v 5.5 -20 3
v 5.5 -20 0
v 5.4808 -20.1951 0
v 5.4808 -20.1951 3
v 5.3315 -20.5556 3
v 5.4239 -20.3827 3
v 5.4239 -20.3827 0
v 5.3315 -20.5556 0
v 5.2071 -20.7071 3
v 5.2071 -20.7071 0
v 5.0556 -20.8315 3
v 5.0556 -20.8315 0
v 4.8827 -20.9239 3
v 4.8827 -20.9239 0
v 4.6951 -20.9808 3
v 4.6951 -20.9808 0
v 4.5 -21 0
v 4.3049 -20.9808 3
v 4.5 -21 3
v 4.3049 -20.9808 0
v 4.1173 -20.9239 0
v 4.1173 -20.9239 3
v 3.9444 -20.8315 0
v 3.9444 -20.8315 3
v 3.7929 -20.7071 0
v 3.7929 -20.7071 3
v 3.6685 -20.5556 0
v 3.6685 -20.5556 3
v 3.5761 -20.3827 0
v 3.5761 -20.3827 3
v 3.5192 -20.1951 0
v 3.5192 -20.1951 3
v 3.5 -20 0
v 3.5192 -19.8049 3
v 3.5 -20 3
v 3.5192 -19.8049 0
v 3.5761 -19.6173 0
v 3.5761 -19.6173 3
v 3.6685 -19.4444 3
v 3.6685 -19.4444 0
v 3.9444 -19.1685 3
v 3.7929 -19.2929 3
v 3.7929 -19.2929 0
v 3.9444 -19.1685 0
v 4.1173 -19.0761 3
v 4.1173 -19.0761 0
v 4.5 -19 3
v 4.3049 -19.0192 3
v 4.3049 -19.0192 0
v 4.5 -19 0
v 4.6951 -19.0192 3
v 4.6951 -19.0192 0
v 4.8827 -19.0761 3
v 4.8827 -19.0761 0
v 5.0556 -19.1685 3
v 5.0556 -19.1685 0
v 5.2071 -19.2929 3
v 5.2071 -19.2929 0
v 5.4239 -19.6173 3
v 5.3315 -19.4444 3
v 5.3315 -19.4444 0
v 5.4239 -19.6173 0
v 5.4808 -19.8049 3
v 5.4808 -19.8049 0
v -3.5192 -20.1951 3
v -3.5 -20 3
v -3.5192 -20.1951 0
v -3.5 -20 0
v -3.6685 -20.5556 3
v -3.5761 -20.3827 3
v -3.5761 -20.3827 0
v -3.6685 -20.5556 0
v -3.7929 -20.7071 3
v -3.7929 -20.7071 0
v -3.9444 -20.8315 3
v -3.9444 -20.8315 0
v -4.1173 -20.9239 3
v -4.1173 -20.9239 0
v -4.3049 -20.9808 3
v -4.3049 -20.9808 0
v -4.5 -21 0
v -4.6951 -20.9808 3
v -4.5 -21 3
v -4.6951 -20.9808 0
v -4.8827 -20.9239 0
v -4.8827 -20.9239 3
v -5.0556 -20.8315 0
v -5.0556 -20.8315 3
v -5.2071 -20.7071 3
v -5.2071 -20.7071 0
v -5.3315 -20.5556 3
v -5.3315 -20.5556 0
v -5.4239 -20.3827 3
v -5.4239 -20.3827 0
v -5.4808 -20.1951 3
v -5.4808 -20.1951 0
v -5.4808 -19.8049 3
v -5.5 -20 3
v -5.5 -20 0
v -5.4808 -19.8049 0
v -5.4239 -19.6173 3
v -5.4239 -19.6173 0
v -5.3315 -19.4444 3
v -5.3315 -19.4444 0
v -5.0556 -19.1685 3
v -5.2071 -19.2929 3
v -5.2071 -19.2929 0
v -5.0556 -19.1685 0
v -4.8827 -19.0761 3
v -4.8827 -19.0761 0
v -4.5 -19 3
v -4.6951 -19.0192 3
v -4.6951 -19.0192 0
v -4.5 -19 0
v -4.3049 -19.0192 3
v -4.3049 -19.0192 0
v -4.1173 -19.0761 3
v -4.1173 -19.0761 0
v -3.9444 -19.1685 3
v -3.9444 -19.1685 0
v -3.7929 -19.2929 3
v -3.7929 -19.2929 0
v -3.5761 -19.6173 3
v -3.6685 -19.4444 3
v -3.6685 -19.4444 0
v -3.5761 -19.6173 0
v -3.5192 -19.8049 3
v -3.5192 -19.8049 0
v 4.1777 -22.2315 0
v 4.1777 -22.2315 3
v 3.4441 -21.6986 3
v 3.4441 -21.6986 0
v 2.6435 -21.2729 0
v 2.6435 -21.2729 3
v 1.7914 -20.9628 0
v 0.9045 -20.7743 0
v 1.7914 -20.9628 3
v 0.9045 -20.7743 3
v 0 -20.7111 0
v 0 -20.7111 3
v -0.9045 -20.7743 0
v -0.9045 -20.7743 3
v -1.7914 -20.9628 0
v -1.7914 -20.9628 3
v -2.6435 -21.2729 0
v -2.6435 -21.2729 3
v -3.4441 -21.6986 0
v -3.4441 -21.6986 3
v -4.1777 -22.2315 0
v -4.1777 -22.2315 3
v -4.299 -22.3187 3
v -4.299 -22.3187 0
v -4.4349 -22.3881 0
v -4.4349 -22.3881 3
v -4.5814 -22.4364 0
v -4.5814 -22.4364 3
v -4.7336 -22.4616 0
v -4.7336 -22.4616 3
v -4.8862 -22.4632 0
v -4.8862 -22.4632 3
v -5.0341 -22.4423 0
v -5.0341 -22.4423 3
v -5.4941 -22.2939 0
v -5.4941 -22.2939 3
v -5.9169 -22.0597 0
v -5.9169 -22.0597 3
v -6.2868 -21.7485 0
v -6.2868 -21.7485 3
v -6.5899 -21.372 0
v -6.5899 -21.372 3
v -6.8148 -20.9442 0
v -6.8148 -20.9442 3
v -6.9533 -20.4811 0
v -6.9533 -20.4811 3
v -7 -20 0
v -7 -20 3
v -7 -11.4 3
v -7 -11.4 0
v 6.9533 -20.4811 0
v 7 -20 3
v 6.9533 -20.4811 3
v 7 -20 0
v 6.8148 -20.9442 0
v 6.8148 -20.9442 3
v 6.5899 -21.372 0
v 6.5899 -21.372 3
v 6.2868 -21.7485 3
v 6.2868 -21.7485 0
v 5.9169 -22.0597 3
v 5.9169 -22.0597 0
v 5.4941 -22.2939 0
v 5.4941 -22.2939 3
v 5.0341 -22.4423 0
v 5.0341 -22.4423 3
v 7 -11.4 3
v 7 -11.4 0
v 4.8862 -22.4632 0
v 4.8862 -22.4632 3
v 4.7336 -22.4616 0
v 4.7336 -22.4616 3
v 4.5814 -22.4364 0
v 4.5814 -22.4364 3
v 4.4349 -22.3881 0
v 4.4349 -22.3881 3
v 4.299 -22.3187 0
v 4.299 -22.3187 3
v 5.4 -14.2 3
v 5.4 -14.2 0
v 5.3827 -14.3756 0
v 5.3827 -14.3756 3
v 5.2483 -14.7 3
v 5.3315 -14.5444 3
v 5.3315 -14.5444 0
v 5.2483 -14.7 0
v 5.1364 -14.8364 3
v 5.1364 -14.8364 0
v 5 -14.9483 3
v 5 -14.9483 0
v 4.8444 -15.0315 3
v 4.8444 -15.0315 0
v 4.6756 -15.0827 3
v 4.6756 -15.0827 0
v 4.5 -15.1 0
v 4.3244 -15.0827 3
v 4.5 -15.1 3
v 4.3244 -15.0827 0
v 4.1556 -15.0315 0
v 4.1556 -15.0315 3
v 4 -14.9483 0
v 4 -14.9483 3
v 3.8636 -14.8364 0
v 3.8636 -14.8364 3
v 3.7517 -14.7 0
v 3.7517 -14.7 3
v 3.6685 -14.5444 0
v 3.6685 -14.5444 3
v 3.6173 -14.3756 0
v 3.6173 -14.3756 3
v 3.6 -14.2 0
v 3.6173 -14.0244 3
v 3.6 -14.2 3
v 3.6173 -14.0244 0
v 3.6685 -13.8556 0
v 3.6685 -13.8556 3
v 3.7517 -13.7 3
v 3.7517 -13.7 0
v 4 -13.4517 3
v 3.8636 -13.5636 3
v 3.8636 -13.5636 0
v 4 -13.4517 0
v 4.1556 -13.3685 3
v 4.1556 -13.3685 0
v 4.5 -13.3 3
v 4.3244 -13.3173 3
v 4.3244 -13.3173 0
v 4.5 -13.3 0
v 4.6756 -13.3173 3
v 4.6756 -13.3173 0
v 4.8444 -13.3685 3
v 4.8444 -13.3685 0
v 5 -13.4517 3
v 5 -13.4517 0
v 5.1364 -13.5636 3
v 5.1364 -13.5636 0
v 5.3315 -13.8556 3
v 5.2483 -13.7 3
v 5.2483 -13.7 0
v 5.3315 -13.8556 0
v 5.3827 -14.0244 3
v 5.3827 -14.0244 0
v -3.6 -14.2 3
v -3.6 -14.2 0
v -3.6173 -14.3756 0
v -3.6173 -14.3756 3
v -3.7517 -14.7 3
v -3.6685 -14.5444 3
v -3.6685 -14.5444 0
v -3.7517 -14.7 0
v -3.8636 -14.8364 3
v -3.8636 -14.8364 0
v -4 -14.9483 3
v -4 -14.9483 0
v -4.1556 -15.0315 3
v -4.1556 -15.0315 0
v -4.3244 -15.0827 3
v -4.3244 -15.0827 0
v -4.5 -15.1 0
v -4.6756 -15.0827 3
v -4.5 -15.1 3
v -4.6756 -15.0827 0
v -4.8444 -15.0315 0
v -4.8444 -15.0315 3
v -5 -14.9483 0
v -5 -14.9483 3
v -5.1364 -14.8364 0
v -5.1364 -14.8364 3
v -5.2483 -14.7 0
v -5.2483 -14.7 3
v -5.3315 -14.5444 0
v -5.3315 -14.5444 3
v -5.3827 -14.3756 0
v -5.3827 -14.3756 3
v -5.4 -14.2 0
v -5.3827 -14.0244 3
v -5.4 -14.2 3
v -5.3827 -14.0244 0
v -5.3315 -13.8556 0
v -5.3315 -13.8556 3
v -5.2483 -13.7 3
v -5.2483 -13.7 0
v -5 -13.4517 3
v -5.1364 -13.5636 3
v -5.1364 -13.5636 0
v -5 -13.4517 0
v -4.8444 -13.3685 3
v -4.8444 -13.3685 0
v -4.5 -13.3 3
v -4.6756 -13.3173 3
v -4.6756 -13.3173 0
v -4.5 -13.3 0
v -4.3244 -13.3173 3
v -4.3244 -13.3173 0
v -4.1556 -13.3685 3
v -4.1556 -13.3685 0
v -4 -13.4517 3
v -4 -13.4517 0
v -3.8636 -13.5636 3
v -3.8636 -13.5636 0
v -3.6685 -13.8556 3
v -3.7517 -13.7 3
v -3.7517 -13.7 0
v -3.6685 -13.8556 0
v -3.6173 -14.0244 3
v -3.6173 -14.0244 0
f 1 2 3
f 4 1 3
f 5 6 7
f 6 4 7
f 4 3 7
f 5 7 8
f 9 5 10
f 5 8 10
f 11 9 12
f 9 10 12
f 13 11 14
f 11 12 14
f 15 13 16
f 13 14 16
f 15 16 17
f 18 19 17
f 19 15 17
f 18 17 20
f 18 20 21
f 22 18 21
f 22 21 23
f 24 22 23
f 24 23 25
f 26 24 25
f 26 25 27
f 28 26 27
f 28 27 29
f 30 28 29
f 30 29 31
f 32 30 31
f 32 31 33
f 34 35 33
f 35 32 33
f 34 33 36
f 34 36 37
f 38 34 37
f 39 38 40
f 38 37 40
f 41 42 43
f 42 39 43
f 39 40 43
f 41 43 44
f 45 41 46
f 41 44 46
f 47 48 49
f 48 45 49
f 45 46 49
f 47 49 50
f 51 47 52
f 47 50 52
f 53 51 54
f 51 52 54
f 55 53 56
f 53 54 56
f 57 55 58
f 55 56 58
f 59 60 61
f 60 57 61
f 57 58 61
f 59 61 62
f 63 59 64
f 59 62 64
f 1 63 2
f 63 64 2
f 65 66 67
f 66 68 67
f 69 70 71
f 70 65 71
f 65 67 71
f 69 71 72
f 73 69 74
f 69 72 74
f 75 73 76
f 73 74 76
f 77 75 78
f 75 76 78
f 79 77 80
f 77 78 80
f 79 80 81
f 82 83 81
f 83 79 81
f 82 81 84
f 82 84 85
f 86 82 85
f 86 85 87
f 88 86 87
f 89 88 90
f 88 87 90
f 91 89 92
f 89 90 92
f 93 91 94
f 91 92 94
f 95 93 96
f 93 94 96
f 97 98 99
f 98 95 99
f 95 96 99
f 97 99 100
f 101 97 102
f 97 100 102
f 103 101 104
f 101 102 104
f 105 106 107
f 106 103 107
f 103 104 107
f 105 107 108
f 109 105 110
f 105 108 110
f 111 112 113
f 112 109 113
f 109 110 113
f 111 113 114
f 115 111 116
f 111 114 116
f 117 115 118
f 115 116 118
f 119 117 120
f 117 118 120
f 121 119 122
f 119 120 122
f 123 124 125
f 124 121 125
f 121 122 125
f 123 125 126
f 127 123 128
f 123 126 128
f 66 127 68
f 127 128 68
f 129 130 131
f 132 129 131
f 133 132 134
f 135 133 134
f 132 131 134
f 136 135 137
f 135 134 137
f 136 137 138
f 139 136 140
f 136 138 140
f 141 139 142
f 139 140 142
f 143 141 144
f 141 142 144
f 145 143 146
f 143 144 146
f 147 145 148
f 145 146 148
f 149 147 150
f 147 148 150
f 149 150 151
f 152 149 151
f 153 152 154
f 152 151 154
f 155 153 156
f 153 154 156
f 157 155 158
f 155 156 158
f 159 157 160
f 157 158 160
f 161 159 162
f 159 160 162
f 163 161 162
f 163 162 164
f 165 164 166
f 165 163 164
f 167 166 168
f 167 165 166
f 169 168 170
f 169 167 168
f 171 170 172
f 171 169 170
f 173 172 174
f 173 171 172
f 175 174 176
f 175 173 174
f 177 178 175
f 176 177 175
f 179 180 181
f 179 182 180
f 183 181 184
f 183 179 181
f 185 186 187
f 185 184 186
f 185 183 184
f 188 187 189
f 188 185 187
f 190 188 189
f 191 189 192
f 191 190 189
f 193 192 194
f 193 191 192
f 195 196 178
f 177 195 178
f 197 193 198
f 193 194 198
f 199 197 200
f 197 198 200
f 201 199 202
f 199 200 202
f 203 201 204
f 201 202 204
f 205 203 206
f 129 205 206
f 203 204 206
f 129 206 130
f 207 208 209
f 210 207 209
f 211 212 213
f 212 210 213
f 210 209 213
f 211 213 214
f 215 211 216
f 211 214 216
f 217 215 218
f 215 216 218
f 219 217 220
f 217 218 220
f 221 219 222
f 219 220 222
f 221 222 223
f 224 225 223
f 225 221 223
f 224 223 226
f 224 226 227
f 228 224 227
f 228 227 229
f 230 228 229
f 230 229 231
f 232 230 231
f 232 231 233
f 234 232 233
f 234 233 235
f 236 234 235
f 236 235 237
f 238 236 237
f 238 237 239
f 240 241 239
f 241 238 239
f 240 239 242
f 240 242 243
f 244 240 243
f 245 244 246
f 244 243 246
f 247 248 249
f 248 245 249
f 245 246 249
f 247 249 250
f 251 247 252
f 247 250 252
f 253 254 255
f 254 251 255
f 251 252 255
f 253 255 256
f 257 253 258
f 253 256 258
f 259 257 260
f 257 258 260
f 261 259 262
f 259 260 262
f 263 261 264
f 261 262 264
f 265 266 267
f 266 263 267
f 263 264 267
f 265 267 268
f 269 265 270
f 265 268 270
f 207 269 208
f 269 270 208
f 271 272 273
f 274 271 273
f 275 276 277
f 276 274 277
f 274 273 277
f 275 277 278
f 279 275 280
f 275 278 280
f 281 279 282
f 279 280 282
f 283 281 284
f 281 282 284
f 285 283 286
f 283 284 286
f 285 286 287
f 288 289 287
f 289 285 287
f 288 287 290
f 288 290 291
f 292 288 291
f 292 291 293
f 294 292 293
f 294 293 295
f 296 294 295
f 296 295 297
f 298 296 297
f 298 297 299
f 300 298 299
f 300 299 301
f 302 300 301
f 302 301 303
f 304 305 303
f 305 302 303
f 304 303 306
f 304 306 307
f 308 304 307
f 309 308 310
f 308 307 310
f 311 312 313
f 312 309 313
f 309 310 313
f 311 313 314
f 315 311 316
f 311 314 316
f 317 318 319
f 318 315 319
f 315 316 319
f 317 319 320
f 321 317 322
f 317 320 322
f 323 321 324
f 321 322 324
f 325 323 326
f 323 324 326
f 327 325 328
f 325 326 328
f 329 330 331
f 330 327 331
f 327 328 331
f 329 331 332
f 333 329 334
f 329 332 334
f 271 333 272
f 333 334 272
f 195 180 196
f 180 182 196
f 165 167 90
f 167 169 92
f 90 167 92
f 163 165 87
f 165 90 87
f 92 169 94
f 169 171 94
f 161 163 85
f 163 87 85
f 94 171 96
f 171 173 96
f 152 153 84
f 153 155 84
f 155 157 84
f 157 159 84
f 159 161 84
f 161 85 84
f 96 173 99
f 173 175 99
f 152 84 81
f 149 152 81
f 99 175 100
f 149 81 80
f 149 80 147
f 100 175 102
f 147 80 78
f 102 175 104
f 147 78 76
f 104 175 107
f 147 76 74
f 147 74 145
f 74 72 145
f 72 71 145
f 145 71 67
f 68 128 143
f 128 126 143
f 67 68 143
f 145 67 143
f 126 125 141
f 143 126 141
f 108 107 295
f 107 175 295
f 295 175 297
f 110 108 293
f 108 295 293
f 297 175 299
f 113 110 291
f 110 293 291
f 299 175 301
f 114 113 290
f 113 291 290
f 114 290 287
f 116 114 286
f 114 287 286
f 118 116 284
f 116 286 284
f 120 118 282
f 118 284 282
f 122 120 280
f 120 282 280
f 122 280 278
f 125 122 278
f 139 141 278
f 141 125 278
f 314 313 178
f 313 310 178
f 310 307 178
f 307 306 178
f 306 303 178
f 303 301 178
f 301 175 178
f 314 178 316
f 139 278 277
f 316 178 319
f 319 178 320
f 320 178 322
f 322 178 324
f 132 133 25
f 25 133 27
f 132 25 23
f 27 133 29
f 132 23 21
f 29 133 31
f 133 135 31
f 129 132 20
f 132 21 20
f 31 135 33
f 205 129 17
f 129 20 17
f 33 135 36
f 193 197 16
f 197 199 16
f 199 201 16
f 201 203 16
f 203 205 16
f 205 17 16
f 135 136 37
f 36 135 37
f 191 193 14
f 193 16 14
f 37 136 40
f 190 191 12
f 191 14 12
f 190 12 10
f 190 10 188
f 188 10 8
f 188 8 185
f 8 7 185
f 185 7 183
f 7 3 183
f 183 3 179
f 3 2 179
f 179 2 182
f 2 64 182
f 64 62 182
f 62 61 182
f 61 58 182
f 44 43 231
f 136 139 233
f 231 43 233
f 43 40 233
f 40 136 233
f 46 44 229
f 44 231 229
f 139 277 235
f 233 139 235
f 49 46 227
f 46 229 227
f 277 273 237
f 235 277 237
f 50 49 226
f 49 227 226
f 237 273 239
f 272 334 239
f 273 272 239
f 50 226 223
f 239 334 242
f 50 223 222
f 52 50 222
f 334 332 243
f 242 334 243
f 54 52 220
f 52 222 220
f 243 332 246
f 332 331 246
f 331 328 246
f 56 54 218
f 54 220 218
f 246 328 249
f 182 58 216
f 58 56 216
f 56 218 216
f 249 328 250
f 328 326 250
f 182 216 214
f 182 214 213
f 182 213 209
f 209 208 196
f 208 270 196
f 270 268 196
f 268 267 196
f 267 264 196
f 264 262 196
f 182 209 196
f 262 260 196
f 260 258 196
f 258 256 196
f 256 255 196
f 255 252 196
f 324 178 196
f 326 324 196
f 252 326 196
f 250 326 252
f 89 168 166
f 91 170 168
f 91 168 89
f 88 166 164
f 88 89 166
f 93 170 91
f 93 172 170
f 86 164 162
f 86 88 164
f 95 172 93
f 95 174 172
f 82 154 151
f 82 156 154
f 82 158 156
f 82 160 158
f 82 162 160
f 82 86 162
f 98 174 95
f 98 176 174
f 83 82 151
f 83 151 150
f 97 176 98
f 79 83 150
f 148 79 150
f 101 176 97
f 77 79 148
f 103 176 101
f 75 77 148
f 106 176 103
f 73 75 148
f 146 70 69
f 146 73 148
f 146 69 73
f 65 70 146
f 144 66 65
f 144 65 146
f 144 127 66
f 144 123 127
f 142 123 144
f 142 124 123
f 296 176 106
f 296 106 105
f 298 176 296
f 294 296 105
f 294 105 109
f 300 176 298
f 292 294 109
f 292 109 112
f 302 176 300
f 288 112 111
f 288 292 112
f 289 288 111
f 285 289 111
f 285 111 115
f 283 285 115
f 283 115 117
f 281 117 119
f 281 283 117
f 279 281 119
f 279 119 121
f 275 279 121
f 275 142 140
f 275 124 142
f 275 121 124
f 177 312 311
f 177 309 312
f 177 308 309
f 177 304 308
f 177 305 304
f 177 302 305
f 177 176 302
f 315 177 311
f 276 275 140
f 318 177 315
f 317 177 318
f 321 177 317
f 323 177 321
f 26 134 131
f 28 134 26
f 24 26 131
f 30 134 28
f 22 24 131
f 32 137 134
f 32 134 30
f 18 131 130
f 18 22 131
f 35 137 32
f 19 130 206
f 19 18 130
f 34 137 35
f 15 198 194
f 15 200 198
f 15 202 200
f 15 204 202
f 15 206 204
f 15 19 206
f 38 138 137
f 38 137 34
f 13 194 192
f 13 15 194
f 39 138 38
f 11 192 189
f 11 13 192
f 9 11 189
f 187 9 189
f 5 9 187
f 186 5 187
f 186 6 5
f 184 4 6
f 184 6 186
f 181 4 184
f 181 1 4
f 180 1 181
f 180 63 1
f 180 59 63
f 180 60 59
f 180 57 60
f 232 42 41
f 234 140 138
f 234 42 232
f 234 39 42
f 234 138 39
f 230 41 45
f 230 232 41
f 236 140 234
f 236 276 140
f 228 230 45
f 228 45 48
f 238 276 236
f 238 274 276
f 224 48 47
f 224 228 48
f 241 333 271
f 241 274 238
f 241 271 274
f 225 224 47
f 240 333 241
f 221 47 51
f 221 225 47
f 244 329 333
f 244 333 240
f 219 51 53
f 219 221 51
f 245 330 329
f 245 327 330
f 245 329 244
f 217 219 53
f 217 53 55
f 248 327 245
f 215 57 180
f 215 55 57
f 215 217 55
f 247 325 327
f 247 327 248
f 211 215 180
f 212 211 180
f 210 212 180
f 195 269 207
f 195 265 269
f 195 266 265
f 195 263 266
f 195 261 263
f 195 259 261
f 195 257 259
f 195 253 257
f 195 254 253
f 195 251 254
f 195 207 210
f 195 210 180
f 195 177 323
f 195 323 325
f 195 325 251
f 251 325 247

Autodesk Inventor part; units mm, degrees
ref_plane "YZ Plane" through (0, 0, 0) normal (1, 0, 0) x (0, 1, 0)
ref_plane "XZ Plane" through (0, 0, 0) normal (0, 1, 0) x (-1, 0, 0)
ref_plane "XY Plane" through (0, 0, 0) normal (0, 0, 1) x (1, 0, 0)
sketch "Sketch1" plane through (0, 0, 0) normal (0, 0, 1) x (1, 0, 0)
  line L0 (7, -20) -> (7, -17)
  line L1 (-7, -17) -> (7, -17)
  line L2 (-7, -17) -> (-7, -20)
  arc A0 (-7, -20) -> (-4.5, -22.5) centre (-4.5, -20) ccw
  line L3 (-4.5, -22.5) -> (4.5, -22.5)
  arc A1 (4.5, -22.5) -> (7, -20) centre (4.5, -20) ccw
  circle A2 centre (-4.5, -20) radius 1
  circle A3 centre (4.5, -20) radius 1
  line L4 (7, -11.4) -> (-7, -11.4)
  line L5 (-7, -11.4) -> (-7, -17)
  line L6 (-7, -17) -> (7, -17)
  line L7 (7, -17) -> (7, -11.4)
  circle A4 centre (4.5, -14.2) radius 0.9
  circle A5 centre (-4.5, -14.2) radius 0.9
  point P0 (0, 0)
extrude "Extrusion1" add sketch "Sketch1" along normal blind 3
sketch "Sketch2" plane through (0, 0, 3) normal (0, 0, 1) x (1, 0, 0)
  circle A0 centre (-4.5, -20) radius 1 projected
  circle A1 centre (4.5, -20) radius 1 projected
  circle A2 centre (0, -27.2111) radius 6.5
  point P0 (0, 0)
extrude "Extrusion2" cut sketch "Sketch2" against normal blind 3 contours A2
fillet "Fillet1" radius 1 2 edges at (-4.4783, -22.5, 1.5) (4.4783, -22.5, 1.5)
properties part number "upper slider pen"
